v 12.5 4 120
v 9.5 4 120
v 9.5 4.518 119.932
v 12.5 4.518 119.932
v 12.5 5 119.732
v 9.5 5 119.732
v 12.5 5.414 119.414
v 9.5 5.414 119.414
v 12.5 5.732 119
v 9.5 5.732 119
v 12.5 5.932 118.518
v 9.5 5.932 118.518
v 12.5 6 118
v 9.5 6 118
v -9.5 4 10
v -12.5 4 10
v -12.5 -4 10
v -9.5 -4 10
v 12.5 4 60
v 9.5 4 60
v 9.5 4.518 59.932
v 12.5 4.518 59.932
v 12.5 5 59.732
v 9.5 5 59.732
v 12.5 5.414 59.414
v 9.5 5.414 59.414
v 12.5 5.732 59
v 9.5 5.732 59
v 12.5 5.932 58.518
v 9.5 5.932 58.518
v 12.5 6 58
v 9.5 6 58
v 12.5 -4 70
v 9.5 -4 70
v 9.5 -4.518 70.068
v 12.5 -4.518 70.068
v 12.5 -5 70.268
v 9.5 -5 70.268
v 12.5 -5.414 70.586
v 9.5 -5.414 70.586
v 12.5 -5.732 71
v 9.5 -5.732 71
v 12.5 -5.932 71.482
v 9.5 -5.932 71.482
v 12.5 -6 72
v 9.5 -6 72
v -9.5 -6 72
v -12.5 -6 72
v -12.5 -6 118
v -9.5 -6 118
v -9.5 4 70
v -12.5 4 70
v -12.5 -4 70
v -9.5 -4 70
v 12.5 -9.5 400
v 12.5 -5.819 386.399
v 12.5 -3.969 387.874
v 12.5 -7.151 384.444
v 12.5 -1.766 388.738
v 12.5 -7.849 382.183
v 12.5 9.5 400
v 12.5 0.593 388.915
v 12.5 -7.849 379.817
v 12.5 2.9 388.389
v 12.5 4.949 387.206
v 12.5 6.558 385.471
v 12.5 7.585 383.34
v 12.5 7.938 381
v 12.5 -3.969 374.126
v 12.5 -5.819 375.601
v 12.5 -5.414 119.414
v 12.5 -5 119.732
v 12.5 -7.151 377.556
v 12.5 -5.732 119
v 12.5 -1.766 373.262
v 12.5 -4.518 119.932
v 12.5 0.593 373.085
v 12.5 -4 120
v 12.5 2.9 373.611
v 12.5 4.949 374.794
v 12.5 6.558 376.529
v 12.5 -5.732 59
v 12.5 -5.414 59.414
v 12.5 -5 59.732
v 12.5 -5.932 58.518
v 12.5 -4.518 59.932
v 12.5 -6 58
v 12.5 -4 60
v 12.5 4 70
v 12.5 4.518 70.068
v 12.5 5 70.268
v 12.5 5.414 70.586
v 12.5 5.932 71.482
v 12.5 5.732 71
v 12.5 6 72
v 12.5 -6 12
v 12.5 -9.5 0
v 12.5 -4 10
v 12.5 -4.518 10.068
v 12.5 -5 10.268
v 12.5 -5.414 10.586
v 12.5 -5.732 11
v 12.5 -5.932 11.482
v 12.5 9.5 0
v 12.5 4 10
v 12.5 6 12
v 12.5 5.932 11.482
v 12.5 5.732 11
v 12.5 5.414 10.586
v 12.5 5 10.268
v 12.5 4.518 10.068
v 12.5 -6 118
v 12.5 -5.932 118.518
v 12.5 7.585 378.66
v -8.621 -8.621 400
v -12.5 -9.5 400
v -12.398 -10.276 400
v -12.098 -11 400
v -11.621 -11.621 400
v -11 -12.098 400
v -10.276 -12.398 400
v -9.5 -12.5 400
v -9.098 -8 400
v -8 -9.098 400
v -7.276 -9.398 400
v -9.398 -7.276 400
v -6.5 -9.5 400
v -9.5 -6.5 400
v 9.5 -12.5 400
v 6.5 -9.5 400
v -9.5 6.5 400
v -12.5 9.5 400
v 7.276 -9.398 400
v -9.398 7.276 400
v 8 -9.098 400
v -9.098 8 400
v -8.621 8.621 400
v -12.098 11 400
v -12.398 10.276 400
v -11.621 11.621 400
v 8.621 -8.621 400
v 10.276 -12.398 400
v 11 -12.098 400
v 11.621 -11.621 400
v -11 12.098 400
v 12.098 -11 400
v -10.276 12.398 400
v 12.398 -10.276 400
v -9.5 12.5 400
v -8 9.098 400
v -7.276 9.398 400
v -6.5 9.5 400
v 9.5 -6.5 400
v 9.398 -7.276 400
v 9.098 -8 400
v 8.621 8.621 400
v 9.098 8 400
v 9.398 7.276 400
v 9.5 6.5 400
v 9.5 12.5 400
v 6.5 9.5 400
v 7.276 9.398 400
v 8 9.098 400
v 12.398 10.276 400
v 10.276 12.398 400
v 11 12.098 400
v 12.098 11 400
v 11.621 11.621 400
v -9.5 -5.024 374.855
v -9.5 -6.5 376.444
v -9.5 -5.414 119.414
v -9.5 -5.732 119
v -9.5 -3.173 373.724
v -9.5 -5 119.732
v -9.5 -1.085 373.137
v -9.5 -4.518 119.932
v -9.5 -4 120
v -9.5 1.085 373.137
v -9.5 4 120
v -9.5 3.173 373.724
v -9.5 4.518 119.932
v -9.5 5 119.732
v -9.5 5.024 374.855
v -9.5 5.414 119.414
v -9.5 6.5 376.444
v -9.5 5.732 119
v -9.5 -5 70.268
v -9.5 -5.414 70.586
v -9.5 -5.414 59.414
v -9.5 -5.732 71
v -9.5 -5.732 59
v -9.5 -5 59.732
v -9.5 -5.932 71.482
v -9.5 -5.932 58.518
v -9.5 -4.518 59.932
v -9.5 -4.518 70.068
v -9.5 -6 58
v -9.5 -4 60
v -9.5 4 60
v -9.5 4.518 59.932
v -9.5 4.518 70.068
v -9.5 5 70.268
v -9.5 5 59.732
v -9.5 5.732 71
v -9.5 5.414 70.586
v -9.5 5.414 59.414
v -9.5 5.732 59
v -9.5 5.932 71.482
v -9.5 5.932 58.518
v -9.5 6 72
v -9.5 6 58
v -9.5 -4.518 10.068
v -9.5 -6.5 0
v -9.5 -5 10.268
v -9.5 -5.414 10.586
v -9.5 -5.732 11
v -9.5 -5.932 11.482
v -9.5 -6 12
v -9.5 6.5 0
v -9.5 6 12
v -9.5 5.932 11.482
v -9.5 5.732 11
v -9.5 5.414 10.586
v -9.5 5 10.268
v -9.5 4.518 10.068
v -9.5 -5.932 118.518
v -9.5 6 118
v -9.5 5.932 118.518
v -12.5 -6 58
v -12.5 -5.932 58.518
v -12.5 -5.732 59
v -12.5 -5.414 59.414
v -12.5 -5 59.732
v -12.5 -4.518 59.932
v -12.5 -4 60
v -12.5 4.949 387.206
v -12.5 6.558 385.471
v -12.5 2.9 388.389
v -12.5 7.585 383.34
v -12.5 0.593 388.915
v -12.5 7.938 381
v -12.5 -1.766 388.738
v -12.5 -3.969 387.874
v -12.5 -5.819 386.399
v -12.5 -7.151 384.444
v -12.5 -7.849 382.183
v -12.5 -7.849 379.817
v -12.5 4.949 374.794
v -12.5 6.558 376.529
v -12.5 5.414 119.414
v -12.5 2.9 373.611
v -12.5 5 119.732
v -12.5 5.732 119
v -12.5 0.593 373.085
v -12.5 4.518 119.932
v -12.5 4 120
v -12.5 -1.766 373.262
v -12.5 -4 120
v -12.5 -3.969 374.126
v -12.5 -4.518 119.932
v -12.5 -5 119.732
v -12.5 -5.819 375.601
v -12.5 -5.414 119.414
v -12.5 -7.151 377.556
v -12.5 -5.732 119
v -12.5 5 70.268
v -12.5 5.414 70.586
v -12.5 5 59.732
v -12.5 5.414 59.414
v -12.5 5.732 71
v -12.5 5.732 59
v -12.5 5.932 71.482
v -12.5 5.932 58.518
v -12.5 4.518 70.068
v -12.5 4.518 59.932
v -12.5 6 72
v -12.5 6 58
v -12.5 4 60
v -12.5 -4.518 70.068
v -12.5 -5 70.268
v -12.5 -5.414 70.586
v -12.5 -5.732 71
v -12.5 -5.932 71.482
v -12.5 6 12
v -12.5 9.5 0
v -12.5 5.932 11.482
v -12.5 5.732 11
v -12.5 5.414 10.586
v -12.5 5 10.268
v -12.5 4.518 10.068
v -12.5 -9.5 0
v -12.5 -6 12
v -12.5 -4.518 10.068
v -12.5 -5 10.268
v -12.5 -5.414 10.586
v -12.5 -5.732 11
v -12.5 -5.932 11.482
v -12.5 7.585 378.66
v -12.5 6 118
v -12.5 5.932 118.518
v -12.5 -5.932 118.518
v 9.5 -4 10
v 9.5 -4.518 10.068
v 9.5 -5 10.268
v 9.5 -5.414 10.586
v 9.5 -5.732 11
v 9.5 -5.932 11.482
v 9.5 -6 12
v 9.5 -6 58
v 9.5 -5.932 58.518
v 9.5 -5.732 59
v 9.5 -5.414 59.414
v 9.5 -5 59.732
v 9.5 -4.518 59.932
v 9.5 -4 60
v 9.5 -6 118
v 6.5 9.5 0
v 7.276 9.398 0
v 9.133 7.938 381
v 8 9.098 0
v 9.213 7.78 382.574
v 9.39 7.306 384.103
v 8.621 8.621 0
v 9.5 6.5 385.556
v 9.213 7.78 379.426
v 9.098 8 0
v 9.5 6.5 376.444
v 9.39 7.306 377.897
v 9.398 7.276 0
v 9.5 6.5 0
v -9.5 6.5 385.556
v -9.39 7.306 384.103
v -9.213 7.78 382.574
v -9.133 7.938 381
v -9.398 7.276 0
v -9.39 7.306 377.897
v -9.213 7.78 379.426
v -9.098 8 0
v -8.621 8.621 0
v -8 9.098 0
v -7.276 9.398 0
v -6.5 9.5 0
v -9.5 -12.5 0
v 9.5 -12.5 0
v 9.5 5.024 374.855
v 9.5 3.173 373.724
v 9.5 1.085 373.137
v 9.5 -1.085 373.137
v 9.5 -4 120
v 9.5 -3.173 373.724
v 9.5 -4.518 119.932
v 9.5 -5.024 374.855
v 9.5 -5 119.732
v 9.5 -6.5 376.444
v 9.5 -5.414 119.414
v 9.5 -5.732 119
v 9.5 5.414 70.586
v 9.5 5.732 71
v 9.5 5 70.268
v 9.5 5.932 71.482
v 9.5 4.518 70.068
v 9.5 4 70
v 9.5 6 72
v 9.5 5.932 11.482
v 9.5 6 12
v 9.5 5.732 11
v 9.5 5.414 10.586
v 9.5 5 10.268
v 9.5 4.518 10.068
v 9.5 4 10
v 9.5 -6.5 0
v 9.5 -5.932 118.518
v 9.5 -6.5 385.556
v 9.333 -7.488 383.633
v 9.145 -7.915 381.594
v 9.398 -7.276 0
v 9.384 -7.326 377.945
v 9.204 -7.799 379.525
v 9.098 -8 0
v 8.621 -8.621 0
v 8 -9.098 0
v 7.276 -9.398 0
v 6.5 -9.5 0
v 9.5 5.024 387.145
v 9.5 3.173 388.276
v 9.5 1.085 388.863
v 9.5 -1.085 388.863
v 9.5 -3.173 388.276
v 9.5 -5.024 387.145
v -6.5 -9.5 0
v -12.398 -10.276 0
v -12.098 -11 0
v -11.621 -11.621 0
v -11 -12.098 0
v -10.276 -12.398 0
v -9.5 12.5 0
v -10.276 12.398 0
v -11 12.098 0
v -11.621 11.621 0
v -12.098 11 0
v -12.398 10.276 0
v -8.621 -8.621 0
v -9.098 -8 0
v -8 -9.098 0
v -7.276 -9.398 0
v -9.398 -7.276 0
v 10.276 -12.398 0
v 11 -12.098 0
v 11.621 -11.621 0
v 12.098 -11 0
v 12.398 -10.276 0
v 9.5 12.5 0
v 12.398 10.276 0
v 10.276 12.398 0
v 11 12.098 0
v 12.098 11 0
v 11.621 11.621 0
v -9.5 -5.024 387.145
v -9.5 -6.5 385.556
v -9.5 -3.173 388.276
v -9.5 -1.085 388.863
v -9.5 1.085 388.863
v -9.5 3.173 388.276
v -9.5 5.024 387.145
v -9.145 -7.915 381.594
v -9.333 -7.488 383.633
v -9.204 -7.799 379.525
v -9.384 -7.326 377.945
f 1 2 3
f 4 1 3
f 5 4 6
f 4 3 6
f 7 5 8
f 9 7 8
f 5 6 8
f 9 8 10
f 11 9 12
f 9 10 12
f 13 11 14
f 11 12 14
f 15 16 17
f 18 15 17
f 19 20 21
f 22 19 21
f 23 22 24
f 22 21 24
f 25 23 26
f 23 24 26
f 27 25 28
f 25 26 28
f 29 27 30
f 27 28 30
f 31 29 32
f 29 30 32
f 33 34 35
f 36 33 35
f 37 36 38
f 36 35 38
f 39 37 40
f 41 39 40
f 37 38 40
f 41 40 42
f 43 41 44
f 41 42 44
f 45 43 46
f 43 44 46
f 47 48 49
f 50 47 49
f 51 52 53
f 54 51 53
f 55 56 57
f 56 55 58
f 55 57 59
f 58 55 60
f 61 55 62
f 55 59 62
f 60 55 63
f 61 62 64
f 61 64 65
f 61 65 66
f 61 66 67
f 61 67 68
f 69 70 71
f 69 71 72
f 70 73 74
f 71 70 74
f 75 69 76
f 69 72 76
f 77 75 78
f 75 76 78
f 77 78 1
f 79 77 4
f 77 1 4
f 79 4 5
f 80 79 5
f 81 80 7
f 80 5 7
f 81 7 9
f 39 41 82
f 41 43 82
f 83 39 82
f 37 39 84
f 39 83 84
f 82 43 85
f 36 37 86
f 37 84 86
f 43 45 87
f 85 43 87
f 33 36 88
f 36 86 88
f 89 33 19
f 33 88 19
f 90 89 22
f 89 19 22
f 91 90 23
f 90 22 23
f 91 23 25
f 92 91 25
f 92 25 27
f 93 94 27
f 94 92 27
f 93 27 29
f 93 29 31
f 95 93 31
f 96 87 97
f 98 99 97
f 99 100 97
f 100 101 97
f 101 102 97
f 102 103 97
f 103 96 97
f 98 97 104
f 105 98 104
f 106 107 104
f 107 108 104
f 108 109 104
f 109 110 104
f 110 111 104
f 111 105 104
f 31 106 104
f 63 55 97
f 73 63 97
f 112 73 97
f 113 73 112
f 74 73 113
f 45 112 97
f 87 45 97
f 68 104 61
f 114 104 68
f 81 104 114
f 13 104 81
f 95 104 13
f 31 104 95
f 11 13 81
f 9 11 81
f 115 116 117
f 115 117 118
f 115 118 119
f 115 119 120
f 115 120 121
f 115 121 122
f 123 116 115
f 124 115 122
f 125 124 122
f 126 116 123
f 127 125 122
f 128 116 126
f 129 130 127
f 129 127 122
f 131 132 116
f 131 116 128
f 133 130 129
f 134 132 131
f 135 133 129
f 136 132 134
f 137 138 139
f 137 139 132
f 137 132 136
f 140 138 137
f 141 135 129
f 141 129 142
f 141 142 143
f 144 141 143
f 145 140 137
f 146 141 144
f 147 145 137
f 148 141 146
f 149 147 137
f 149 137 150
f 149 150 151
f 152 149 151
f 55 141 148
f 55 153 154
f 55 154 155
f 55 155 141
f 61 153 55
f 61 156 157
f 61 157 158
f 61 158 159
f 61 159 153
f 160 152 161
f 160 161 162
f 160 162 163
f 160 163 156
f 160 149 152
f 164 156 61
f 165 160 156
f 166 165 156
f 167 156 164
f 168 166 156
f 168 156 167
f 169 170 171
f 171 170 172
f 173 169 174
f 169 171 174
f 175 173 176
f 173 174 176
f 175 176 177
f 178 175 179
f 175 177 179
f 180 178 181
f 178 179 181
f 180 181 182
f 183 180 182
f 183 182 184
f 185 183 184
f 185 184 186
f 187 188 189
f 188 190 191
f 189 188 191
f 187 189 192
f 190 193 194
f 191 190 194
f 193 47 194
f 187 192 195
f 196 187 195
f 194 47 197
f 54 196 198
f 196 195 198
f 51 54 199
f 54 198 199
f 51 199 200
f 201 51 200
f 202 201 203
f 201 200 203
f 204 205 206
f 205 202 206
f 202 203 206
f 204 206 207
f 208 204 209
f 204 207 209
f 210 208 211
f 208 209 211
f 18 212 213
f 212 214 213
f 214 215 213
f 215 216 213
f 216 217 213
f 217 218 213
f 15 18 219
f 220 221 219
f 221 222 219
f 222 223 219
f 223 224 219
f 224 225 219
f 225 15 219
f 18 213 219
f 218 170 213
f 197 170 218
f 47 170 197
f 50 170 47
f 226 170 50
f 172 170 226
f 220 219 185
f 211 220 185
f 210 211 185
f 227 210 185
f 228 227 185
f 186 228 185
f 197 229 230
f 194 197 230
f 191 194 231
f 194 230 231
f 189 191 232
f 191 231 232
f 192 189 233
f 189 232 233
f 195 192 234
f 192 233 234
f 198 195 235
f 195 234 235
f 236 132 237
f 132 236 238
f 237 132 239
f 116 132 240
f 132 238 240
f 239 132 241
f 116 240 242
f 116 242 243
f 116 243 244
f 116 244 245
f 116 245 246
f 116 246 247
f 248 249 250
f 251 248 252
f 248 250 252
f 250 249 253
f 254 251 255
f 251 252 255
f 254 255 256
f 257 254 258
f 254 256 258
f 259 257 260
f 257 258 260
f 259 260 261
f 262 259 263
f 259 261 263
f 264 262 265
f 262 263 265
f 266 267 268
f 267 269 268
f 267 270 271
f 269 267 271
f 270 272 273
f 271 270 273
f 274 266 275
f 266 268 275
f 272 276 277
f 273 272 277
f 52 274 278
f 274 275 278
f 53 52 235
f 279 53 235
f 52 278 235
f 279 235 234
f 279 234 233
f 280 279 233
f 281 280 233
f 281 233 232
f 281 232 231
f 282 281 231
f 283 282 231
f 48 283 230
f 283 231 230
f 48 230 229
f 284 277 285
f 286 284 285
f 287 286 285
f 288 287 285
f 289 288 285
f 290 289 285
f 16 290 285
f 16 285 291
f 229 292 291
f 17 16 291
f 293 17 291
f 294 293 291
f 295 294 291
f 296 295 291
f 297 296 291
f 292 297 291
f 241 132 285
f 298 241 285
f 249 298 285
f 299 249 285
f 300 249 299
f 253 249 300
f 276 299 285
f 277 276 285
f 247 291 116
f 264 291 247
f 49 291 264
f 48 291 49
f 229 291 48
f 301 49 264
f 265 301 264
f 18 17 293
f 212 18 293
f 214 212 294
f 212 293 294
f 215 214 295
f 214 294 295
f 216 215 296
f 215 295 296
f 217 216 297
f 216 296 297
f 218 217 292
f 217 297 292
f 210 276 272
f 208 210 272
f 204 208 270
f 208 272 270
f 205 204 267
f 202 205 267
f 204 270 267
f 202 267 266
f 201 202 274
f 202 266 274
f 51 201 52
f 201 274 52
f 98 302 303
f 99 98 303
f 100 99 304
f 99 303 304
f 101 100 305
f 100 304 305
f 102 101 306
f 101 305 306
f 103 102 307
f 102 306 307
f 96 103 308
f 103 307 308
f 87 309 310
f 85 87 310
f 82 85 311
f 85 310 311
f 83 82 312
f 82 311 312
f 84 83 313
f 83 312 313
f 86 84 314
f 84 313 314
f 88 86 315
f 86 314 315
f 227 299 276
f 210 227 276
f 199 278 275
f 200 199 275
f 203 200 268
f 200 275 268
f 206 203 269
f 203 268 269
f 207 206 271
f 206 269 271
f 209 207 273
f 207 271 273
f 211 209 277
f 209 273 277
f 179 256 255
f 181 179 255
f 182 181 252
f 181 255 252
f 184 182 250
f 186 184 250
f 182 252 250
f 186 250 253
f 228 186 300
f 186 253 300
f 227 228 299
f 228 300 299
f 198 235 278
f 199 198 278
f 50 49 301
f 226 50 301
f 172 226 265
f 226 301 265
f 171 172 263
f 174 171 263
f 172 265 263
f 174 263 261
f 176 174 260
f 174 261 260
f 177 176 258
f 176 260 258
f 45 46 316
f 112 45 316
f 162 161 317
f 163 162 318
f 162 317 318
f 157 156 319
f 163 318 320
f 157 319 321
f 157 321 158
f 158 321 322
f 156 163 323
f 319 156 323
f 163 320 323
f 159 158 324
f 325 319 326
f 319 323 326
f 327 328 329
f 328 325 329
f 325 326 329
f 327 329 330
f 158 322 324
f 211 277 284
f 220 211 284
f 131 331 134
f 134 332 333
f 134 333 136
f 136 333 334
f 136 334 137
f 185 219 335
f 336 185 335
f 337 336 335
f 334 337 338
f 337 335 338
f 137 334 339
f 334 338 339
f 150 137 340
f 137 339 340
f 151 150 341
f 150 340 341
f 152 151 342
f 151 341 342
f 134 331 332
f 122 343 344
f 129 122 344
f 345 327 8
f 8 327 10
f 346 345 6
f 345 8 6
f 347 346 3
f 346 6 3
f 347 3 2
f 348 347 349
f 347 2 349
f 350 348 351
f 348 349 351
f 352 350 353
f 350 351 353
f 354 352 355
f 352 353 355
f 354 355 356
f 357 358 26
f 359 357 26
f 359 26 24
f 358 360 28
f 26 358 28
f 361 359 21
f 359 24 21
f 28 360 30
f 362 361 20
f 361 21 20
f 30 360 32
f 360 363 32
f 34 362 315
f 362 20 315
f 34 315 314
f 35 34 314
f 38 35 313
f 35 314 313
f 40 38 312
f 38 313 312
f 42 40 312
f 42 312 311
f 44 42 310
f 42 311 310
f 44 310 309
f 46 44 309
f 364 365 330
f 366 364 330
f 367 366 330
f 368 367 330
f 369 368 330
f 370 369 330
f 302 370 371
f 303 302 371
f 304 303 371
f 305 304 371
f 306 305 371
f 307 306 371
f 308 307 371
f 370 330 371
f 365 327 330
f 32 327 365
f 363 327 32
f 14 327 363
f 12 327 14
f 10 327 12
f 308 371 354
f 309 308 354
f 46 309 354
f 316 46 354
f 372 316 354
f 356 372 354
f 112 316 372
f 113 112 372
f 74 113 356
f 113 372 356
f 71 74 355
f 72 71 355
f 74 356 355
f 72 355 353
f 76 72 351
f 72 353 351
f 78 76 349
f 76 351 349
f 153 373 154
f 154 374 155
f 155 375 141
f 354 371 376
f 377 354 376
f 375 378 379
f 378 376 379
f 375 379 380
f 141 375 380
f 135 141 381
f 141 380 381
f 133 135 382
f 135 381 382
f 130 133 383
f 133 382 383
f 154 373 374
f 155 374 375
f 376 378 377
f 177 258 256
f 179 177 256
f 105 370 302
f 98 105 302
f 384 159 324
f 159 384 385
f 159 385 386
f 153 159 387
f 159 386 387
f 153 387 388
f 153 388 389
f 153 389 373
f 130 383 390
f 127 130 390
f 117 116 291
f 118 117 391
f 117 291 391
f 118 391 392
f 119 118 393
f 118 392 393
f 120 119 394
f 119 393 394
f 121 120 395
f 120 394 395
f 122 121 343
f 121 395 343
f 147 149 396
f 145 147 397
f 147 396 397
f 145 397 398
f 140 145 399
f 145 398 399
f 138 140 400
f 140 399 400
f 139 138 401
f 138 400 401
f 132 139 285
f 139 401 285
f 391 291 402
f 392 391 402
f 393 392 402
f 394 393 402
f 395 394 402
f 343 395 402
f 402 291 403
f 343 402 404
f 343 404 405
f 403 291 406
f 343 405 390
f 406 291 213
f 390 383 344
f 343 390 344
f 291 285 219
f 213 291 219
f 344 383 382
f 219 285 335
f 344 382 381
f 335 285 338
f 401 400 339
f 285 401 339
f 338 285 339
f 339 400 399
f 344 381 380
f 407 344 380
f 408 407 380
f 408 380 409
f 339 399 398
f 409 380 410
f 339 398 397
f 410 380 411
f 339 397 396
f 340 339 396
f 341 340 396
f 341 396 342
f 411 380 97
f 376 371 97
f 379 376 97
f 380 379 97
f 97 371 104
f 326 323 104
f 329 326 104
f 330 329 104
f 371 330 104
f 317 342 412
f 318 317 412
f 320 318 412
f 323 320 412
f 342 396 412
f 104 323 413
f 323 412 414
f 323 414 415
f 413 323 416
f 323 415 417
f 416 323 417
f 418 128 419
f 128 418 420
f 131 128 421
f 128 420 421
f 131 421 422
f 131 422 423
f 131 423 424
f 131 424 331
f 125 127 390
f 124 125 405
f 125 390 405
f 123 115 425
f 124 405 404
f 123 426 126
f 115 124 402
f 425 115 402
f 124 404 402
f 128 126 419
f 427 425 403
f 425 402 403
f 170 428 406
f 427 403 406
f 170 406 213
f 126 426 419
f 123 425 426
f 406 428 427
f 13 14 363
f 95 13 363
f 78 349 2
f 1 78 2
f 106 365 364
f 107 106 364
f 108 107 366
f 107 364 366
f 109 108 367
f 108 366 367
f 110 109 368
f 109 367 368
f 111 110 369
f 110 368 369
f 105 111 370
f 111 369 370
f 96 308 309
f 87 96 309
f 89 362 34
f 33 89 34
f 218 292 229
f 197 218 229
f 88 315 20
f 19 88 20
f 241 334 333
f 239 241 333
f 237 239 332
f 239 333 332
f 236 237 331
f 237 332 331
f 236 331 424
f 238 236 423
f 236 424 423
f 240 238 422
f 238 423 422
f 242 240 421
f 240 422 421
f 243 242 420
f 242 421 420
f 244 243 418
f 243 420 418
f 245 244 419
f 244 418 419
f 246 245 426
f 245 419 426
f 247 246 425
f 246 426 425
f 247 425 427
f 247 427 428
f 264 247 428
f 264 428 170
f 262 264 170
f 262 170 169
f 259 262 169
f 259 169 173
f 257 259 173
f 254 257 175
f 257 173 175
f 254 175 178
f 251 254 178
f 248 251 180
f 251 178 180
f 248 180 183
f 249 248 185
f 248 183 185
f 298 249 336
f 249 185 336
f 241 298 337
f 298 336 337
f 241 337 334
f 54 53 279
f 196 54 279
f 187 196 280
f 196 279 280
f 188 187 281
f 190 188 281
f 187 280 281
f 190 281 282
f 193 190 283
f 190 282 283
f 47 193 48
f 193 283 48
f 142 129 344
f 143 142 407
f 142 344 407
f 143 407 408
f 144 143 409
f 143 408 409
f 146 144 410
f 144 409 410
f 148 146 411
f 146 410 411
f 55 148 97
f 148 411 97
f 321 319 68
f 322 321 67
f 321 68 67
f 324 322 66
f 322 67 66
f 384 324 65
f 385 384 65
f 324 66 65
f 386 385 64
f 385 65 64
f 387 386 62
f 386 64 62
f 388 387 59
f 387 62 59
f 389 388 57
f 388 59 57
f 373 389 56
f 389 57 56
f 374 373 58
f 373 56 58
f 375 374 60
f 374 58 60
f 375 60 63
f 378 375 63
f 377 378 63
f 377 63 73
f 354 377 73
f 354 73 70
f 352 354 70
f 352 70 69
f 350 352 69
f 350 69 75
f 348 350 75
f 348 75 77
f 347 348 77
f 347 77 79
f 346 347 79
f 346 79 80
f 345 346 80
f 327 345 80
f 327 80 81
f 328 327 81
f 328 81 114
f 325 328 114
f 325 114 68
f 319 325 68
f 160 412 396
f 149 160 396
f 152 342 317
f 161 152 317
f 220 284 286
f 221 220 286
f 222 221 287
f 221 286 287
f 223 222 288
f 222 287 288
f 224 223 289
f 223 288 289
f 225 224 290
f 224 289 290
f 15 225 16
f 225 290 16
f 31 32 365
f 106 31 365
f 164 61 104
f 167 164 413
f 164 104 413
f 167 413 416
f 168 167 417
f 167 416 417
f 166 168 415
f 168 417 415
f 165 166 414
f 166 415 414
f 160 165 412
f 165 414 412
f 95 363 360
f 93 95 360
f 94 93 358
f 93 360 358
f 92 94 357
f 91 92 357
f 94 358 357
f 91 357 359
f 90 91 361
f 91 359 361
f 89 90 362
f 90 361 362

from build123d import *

# Parameters (mm, degrees)
F1_DEPTH = 400
F3_DEPTH = 25.001
F4_R     = 7.9375
F5_DEPTH = 25.001


with BuildPart() as f1:
    # F0 (on Top) → F1 (new body)
    with BuildSketch(Plane.XY):
        with BuildLine():
            ThreePointArc((12.5, 9.5), (11.62132, 11.62132), (9.5, 12.5))
            Line((9.5, 12.5), (-9.5, 12.5))
            ThreePointArc((-9.5, 12.5), (-11.62132, 11.62132), (-12.5, 9.5))
            Line((-12.5, 9.5), (-12.5, -9.5))
            ThreePointArc((-12.5, -9.5), (-11.62132, -11.62132), (-9.5, -12.5))
            Line((-9.5, -12.5), (9.5, -12.5))
            ThreePointArc((9.5, -12.5), (11.62132, -11.62132), (12.5, -9.5))
            Line((12.5, -9.5), (12.5, 9.5))
        make_face()
        with BuildLine():
            Line((-6.5, 9.5), (6.5, 9.5))
            ThreePointArc((6.5, 9.5), (8.62132, 8.62132), (9.5, 6.5))
            Line((9.5, 6.5), (9.5, -6.5))
            ThreePointArc((9.5, -6.5), (8.62132, -8.62132), (6.5, -9.5))
            Line((6.5, -9.5), (-6.5, -9.5))
            ThreePointArc((-6.5, -9.5), (-8.62132, -8.62132), (-9.5, -6.5))
            Line((-9.5, -6.5), (-9.5, 6.5))
            ThreePointArc((-9.5, 6.5), (-8.62132, 8.62132), (-6.5, 9.5))
        make_face(mode=Mode.SUBTRACT)
    extrude(amount=F1_DEPTH)

    # F2 (on face) → F3 (cut, through all)
    with BuildSketch(Plane(origin=(-12.5, 0, 0), x_dir=(0, -1, 0), z_dir=(-1, 0, 0))):
        with BuildLine():
            ThreePointArc((6, 58), (5.414214, 59.414214), (4, 60))
            Line((4, 60), (-4, 60))
            ThreePointArc((-4, 60), (-5.414214, 59.414214), (-6, 58))
            Line((-6, 58), (-6, 12))
            ThreePointArc((-6, 12), (-5.414214, 10.585786), (-4, 10))
            Line((-4, 10), (4, 10))
            ThreePointArc((4, 10), (5.414214, 10.585786), (6, 12))
            Line((6, 12), (6, 58))
        make_face()
        with BuildLine():
            ThreePointArc((6, 118), (5.414214, 119.414214), (4, 120))
            Line((4, 120), (-4, 120))
            ThreePointArc((-4, 120), (-5.414214, 119.414214), (-6, 118))
            Line((-6, 118), (-6, 72))
            ThreePointArc((-6, 72), (-5.414214, 70.585786), (-4, 70))
            Line((-4, 70), (4, 70))
            ThreePointArc((4, 70), (5.414214, 70.585786), (6, 72))
            Line((6, 72), (6, 118))
        make_face()
    extrude(amount=-F3_DEPTH, mode=Mode.SUBTRACT)

    # F4 (on face) → F5 (cut, through all)
    with BuildSketch(Plane.YZ.offset(12.5)):
        with Locations((0, 381)):
            Circle(F4_R)
    extrude(amount=-F5_DEPTH, mode=Mode.SUBTRACT)


solid = f1.part
